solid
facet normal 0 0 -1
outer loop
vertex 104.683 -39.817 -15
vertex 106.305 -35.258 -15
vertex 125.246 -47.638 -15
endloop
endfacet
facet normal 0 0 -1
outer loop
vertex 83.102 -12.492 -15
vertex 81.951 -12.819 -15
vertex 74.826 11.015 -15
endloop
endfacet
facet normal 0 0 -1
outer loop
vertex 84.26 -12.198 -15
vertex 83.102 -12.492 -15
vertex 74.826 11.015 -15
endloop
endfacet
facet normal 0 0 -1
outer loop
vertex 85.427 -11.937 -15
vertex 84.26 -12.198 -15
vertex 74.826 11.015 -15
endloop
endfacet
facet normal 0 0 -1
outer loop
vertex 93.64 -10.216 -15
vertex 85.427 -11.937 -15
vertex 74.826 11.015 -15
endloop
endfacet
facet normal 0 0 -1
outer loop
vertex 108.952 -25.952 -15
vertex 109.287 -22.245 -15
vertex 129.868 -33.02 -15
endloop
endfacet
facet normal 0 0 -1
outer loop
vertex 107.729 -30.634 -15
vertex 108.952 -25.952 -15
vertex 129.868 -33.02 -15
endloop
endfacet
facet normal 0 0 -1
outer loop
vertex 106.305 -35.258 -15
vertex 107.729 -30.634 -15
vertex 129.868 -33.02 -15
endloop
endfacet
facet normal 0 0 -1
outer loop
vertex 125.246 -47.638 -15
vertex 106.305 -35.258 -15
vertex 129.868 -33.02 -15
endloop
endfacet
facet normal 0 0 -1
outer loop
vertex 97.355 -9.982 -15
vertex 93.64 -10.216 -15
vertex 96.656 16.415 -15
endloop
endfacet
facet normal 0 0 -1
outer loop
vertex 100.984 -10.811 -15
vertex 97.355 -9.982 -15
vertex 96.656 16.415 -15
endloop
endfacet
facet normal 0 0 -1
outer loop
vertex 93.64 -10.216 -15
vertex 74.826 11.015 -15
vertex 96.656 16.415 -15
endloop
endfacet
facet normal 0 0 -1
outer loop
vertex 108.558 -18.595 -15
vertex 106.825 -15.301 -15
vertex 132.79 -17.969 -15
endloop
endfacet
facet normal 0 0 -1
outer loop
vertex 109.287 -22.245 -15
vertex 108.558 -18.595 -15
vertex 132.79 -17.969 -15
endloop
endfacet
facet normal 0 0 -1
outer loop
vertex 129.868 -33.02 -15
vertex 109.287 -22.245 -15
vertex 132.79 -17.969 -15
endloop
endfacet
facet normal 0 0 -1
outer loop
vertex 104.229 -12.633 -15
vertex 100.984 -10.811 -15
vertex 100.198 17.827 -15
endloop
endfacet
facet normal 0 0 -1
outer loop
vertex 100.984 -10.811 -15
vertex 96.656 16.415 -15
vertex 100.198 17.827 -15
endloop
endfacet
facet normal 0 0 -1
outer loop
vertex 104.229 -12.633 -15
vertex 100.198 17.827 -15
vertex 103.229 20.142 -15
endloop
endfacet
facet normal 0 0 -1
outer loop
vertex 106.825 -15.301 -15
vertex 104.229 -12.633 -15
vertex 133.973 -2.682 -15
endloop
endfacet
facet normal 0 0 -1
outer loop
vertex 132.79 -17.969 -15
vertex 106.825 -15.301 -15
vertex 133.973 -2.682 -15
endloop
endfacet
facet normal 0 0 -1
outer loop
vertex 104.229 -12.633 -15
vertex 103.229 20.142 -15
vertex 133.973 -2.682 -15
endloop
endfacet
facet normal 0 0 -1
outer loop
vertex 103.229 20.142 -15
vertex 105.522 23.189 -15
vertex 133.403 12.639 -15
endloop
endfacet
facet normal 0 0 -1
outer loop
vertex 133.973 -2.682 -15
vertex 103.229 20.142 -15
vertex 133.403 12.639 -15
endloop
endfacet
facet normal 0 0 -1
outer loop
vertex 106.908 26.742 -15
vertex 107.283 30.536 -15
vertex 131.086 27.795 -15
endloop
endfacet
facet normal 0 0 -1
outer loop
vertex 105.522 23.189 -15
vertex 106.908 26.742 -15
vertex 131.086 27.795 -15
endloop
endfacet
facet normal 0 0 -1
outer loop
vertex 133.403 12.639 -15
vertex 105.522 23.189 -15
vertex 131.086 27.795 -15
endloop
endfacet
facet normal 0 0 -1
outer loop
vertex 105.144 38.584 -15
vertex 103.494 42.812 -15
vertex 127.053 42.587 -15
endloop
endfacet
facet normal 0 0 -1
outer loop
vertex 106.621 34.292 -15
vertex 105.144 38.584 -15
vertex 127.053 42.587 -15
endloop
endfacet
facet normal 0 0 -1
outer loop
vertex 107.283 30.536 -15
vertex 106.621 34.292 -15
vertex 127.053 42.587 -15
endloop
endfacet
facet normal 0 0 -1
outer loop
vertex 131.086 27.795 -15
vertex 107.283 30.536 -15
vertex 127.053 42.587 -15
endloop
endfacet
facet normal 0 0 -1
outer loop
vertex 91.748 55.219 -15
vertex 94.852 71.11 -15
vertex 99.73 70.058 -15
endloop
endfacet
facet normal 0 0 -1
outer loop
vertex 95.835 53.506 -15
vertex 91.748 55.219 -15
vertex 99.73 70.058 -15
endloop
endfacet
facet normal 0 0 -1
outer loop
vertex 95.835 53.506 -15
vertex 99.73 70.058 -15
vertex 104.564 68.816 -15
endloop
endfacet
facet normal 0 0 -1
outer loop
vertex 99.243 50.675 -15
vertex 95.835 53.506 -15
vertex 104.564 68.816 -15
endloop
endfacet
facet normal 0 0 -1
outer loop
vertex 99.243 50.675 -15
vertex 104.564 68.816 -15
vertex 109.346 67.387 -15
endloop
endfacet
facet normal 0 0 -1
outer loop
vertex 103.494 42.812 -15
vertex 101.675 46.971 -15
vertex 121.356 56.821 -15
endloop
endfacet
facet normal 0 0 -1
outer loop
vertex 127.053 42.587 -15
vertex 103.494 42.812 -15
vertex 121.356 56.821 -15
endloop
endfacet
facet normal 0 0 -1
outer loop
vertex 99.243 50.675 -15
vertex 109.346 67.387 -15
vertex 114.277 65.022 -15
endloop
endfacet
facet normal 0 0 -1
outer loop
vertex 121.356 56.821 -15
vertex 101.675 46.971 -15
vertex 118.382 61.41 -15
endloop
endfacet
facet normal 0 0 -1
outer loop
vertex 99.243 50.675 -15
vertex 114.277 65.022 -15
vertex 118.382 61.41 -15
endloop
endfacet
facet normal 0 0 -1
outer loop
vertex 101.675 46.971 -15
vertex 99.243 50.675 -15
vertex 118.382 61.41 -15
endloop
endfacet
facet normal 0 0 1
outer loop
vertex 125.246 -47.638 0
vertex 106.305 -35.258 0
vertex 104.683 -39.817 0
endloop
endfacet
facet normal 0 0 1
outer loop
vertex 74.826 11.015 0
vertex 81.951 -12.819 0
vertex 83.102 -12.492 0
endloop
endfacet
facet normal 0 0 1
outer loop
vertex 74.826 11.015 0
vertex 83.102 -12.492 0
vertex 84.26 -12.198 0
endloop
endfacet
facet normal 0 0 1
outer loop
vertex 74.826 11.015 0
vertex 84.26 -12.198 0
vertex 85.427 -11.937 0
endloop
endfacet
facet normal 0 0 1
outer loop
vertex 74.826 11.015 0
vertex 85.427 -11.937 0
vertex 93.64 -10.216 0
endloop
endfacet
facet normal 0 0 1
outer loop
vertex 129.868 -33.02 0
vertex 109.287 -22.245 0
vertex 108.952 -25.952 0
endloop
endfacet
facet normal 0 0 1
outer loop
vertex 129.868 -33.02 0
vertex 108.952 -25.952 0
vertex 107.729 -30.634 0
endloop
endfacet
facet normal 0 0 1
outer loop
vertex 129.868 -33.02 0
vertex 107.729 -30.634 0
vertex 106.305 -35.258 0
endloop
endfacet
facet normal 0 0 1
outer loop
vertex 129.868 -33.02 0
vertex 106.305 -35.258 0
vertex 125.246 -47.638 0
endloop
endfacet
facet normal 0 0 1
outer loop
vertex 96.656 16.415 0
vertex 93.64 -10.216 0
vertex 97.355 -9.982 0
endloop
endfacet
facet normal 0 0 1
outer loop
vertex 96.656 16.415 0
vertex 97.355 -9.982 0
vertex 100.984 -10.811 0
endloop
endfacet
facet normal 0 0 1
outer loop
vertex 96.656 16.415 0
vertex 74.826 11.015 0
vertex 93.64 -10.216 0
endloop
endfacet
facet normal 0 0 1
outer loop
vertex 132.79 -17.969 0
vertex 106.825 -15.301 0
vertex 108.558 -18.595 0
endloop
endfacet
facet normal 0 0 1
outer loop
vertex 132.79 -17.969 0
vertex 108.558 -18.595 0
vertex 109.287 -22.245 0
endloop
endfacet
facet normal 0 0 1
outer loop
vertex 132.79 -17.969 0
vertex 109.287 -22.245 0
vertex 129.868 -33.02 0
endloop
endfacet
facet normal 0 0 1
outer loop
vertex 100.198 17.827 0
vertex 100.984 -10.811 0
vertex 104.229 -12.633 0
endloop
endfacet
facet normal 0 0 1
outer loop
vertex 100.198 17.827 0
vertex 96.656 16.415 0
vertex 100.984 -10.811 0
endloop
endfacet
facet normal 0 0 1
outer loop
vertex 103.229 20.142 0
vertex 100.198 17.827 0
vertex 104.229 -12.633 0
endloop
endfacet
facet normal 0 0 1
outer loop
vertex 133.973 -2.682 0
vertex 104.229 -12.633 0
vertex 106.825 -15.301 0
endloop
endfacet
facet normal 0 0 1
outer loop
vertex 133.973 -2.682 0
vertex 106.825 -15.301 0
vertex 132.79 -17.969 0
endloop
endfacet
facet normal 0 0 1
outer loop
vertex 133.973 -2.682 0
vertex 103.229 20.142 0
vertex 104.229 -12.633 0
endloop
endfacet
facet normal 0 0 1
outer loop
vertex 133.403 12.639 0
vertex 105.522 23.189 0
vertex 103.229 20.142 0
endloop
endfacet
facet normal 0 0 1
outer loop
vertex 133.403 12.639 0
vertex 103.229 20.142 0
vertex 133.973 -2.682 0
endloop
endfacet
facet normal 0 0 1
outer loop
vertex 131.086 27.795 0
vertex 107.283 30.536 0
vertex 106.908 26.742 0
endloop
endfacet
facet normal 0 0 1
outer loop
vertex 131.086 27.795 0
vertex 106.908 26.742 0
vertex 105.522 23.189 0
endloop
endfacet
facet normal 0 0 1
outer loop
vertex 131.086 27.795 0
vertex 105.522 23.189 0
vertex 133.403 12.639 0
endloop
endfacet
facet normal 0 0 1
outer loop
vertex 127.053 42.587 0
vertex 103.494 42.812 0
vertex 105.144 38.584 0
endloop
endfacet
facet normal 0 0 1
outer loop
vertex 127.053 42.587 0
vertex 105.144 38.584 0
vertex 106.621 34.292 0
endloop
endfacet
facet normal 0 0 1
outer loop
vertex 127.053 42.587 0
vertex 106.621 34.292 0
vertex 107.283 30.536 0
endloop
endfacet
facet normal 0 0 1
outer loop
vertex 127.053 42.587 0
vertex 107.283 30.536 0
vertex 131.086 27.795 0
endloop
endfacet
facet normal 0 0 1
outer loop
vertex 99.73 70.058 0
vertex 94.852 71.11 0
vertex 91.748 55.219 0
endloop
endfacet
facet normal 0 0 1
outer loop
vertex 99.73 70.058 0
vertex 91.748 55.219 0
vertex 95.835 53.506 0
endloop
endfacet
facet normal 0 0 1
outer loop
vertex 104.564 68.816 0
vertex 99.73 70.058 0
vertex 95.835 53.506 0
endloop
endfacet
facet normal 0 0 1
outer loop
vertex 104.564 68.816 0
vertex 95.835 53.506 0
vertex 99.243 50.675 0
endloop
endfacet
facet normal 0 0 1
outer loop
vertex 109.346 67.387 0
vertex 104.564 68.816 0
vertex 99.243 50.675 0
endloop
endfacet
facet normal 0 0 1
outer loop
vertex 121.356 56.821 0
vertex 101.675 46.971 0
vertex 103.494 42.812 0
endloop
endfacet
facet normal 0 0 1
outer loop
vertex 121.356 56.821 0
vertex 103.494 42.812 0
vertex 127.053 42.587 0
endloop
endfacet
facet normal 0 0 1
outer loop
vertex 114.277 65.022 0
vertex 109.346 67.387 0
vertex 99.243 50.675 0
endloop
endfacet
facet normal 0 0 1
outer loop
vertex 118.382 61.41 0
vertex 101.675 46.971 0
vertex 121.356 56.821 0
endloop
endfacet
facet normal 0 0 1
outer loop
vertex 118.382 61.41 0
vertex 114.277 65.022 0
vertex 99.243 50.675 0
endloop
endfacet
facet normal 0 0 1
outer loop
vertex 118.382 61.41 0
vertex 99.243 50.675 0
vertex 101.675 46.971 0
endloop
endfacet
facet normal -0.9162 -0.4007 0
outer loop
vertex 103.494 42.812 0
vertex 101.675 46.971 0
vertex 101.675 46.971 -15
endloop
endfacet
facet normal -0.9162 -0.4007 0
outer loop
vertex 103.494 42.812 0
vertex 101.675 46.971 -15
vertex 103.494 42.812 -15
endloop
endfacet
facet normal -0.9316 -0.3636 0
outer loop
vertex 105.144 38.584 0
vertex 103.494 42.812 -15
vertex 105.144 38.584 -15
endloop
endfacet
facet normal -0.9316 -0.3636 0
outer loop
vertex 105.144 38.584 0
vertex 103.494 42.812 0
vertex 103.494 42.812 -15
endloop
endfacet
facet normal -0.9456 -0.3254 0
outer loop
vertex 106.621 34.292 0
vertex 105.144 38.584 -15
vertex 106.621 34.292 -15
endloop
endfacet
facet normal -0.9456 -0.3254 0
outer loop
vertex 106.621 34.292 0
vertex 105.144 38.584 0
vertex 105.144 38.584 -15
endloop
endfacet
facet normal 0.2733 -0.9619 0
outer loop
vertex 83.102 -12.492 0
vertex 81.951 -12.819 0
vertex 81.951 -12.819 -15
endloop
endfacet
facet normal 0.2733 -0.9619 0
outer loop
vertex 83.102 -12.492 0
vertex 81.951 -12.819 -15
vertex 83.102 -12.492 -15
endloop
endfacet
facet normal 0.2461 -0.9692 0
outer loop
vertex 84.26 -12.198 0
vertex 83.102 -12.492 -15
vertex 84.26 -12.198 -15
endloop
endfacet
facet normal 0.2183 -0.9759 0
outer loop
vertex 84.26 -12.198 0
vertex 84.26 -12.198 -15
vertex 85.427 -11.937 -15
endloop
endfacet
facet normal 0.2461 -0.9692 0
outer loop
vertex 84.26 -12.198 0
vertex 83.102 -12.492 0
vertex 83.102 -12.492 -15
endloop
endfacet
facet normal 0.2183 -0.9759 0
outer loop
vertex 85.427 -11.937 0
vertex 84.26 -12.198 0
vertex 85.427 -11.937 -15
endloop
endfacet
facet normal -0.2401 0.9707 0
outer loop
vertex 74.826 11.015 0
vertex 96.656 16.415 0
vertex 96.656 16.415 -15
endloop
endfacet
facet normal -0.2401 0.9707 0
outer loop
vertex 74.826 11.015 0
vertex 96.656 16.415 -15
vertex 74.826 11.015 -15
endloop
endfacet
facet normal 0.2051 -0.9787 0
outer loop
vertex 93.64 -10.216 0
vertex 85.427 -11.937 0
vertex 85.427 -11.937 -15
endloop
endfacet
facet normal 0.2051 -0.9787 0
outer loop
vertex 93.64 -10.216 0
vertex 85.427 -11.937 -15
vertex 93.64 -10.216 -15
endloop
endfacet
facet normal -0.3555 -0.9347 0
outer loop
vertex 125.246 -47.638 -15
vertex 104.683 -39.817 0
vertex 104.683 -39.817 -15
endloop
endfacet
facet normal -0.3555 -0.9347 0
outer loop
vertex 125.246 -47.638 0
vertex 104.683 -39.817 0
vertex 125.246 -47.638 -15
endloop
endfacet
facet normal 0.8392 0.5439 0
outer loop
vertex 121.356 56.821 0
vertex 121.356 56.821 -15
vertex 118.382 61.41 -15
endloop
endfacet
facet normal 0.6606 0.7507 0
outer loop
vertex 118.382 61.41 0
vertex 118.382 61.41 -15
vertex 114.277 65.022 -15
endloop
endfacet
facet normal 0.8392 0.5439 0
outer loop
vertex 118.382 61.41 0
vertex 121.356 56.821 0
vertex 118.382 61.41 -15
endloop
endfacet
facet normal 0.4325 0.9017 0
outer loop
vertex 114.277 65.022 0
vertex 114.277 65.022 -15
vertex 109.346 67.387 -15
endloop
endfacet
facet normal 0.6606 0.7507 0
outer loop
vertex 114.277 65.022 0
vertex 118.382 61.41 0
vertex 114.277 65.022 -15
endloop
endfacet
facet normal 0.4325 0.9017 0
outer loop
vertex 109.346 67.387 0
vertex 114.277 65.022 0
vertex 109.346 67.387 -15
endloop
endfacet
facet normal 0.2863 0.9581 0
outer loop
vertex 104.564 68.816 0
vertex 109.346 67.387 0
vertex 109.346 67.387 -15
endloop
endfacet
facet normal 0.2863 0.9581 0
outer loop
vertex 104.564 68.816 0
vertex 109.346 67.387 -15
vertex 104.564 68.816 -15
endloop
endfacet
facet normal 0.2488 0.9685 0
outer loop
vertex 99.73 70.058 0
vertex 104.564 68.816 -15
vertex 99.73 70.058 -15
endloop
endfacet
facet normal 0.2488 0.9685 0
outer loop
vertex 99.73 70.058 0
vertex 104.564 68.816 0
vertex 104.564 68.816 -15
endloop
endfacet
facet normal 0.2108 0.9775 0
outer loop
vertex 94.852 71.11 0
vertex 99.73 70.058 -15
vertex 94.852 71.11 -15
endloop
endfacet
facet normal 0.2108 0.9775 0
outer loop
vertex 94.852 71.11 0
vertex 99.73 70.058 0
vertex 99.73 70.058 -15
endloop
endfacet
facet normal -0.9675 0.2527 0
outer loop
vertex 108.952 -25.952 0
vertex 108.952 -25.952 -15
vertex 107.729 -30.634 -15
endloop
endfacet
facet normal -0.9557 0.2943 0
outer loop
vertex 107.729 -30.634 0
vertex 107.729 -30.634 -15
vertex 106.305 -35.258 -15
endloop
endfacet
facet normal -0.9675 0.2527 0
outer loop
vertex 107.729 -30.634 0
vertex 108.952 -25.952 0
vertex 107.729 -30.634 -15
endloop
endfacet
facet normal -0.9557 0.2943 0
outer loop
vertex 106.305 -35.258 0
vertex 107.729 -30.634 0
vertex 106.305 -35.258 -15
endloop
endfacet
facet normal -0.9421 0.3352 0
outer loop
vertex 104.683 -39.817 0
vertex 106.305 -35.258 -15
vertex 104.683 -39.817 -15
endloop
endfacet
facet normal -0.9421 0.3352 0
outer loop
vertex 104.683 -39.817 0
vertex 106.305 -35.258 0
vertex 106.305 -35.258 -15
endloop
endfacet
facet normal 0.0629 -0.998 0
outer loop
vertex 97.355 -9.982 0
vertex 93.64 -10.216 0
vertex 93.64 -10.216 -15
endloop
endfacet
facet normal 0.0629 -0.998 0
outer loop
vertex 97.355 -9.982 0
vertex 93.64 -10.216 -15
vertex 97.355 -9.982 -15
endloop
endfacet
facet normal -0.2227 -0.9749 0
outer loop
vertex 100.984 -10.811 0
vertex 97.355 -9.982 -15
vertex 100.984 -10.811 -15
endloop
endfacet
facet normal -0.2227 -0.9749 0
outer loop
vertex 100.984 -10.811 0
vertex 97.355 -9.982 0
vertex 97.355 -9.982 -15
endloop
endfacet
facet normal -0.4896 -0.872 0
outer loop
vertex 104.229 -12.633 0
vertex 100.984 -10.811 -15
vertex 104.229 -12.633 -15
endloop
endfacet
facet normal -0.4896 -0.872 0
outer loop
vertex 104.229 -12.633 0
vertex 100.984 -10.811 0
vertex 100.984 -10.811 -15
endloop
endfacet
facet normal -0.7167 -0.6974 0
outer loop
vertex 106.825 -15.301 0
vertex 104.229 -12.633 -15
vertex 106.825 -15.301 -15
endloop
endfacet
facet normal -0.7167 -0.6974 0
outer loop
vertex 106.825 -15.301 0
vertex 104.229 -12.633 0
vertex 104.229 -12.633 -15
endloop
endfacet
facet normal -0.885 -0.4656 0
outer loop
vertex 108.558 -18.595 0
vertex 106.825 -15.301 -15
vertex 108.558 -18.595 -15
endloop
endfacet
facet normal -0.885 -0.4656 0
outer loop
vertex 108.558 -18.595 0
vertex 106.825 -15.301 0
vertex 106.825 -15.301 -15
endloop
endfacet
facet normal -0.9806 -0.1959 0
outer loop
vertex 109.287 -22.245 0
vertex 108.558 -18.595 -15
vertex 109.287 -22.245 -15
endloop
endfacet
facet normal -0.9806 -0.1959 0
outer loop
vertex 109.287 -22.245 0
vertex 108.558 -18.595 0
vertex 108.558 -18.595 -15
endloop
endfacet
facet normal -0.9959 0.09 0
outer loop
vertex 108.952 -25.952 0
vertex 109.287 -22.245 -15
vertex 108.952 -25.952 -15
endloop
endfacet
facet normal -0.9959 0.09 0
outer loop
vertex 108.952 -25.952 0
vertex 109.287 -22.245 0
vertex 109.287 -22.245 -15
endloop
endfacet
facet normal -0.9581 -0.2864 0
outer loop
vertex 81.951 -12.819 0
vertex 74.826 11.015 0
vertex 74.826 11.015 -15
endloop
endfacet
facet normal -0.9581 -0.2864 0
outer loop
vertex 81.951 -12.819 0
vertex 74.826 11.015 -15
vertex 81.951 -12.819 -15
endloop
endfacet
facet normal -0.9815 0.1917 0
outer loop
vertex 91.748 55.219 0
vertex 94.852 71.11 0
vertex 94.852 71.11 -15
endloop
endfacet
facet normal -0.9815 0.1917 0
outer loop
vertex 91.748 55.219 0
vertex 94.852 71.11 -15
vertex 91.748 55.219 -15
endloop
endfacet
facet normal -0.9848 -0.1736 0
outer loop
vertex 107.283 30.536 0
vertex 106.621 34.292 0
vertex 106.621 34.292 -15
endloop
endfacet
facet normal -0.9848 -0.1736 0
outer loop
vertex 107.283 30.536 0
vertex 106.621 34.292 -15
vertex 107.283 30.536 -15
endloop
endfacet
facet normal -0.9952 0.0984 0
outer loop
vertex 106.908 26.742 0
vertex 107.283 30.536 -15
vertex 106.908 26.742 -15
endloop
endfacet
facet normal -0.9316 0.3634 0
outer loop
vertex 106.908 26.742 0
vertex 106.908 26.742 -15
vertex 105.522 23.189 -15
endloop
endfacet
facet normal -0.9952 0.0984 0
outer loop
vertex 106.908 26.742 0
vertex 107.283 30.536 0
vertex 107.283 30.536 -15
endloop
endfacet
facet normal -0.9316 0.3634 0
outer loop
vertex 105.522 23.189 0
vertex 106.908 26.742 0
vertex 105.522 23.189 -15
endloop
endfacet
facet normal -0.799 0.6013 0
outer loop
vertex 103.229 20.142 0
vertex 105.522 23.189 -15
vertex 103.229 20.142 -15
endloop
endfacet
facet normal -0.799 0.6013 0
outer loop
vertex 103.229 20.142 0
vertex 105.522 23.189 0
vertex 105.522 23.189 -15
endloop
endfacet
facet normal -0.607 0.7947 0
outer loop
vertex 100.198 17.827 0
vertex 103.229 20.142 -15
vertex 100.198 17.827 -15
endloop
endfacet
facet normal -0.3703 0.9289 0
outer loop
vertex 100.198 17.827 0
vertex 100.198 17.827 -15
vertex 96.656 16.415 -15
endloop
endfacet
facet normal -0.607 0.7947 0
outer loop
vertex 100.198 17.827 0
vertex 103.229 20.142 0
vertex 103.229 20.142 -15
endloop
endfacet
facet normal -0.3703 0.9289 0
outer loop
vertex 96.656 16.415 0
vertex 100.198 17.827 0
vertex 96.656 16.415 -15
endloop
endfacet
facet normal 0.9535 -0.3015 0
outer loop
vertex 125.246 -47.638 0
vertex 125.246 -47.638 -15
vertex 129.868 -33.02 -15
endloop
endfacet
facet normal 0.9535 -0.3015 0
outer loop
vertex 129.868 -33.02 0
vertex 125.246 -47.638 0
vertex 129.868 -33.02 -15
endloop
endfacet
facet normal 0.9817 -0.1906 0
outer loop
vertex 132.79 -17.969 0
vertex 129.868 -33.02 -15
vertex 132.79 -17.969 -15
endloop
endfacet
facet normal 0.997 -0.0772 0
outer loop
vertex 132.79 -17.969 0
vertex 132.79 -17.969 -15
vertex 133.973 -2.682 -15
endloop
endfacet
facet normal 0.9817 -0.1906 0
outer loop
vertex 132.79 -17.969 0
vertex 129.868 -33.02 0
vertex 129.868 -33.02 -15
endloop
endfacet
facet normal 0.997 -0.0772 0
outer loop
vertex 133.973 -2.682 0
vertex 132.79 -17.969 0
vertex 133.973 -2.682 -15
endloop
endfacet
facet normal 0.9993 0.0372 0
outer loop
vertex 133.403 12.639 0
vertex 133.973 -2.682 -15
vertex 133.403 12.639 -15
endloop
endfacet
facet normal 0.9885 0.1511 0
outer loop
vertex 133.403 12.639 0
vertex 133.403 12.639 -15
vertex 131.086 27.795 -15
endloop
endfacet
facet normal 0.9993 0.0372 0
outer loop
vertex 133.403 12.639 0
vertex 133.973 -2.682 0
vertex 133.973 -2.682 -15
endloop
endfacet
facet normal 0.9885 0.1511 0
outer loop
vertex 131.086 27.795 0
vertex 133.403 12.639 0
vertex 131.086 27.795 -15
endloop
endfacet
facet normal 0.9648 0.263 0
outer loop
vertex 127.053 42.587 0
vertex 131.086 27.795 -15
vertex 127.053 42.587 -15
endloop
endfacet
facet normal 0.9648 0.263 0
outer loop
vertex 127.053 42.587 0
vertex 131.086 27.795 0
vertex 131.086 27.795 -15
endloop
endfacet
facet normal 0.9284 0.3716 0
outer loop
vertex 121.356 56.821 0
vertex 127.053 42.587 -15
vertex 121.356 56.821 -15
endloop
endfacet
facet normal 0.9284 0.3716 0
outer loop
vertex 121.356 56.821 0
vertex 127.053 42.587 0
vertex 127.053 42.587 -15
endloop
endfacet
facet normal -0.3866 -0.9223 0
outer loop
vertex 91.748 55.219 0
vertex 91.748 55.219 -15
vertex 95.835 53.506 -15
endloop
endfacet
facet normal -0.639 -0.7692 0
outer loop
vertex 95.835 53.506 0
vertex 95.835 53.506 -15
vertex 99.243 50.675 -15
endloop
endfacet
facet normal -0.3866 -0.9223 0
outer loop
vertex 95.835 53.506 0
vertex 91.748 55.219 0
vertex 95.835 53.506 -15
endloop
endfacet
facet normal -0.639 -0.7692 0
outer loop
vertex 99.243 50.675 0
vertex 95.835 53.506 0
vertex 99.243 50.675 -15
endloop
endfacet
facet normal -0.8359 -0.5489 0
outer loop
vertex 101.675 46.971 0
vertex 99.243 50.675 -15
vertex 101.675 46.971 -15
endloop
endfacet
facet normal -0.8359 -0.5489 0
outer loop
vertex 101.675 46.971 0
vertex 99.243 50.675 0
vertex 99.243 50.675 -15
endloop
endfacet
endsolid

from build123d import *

# Parameters (mm, degrees)
DODANIE_WYCI_GNI_CIE1_DEPTH = 15


with BuildPart() as part:
    # Szkic2 → Dodanie-wyciągnięcie1 (new body)
    with BuildSketch(Plane(origin=(0, 0, 0), x_dir=(-1, 0, 0), z_dir=(0, 0, -1))):
        with BuildLine():
            Line((-74.826032056, 11.014530402), (-81.951422725, -12.818572719))
            ThreePointArc((-81.951422725, -12.818572719), (-83.679858685, -12.341119841), (-85.426816489, -11.936656557))
            Line((-85.426816489, -11.936656557), (-93.639920436, -10.215979742))
            ThreePointArc((-93.639920436, -10.215979742), (-105.622705702, -13.873790687), (-108.951787413, -25.952033051))
            ThreePointArc((-108.951787413, -25.952033051), (-107.042286981, -32.953737236), (-104.683334782, -39.817074466))
            Line((-104.683334782, -39.817074466), (-125.246132685, -47.638285521))
            ThreePointArc((-125.246132685, -47.638285521), (-133.907193125, 4.986344284), (-121.356345693, 56.821099602))
            ThreePointArc((-121.356345693, 56.821099602), (-116.45353268, 63.356793916), (-109.346193532, 67.386509274))
            ThreePointArc((-109.346193532, 67.386509274), (-102.153493063, 69.460884834), (-94.851646537, 71.110433658))
            Line((-94.851646537, 71.110433658), (-91.74794023, 55.218917354))
            ThreePointArc((-91.74794023, 55.218917354), (-97.643827413, 52.217038431), (-101.674756414, 46.970670723))
            ThreePointArc((-101.674756414, 46.970670723), (-104.340687454, 40.706522101), (-106.621107385, 34.291973698))
            ThreePointArc((-106.621107385, 34.291973698), (-105.521825108, 23.188783802), (-96.655711946, 16.415211274))
            Line((-96.655711946, 16.415211274), (-74.826032056, 11.014530402))
        make_face()
    extrude(amount=DODANIE_WYCI_GNI_CIE1_DEPTH)


solid = part.part
